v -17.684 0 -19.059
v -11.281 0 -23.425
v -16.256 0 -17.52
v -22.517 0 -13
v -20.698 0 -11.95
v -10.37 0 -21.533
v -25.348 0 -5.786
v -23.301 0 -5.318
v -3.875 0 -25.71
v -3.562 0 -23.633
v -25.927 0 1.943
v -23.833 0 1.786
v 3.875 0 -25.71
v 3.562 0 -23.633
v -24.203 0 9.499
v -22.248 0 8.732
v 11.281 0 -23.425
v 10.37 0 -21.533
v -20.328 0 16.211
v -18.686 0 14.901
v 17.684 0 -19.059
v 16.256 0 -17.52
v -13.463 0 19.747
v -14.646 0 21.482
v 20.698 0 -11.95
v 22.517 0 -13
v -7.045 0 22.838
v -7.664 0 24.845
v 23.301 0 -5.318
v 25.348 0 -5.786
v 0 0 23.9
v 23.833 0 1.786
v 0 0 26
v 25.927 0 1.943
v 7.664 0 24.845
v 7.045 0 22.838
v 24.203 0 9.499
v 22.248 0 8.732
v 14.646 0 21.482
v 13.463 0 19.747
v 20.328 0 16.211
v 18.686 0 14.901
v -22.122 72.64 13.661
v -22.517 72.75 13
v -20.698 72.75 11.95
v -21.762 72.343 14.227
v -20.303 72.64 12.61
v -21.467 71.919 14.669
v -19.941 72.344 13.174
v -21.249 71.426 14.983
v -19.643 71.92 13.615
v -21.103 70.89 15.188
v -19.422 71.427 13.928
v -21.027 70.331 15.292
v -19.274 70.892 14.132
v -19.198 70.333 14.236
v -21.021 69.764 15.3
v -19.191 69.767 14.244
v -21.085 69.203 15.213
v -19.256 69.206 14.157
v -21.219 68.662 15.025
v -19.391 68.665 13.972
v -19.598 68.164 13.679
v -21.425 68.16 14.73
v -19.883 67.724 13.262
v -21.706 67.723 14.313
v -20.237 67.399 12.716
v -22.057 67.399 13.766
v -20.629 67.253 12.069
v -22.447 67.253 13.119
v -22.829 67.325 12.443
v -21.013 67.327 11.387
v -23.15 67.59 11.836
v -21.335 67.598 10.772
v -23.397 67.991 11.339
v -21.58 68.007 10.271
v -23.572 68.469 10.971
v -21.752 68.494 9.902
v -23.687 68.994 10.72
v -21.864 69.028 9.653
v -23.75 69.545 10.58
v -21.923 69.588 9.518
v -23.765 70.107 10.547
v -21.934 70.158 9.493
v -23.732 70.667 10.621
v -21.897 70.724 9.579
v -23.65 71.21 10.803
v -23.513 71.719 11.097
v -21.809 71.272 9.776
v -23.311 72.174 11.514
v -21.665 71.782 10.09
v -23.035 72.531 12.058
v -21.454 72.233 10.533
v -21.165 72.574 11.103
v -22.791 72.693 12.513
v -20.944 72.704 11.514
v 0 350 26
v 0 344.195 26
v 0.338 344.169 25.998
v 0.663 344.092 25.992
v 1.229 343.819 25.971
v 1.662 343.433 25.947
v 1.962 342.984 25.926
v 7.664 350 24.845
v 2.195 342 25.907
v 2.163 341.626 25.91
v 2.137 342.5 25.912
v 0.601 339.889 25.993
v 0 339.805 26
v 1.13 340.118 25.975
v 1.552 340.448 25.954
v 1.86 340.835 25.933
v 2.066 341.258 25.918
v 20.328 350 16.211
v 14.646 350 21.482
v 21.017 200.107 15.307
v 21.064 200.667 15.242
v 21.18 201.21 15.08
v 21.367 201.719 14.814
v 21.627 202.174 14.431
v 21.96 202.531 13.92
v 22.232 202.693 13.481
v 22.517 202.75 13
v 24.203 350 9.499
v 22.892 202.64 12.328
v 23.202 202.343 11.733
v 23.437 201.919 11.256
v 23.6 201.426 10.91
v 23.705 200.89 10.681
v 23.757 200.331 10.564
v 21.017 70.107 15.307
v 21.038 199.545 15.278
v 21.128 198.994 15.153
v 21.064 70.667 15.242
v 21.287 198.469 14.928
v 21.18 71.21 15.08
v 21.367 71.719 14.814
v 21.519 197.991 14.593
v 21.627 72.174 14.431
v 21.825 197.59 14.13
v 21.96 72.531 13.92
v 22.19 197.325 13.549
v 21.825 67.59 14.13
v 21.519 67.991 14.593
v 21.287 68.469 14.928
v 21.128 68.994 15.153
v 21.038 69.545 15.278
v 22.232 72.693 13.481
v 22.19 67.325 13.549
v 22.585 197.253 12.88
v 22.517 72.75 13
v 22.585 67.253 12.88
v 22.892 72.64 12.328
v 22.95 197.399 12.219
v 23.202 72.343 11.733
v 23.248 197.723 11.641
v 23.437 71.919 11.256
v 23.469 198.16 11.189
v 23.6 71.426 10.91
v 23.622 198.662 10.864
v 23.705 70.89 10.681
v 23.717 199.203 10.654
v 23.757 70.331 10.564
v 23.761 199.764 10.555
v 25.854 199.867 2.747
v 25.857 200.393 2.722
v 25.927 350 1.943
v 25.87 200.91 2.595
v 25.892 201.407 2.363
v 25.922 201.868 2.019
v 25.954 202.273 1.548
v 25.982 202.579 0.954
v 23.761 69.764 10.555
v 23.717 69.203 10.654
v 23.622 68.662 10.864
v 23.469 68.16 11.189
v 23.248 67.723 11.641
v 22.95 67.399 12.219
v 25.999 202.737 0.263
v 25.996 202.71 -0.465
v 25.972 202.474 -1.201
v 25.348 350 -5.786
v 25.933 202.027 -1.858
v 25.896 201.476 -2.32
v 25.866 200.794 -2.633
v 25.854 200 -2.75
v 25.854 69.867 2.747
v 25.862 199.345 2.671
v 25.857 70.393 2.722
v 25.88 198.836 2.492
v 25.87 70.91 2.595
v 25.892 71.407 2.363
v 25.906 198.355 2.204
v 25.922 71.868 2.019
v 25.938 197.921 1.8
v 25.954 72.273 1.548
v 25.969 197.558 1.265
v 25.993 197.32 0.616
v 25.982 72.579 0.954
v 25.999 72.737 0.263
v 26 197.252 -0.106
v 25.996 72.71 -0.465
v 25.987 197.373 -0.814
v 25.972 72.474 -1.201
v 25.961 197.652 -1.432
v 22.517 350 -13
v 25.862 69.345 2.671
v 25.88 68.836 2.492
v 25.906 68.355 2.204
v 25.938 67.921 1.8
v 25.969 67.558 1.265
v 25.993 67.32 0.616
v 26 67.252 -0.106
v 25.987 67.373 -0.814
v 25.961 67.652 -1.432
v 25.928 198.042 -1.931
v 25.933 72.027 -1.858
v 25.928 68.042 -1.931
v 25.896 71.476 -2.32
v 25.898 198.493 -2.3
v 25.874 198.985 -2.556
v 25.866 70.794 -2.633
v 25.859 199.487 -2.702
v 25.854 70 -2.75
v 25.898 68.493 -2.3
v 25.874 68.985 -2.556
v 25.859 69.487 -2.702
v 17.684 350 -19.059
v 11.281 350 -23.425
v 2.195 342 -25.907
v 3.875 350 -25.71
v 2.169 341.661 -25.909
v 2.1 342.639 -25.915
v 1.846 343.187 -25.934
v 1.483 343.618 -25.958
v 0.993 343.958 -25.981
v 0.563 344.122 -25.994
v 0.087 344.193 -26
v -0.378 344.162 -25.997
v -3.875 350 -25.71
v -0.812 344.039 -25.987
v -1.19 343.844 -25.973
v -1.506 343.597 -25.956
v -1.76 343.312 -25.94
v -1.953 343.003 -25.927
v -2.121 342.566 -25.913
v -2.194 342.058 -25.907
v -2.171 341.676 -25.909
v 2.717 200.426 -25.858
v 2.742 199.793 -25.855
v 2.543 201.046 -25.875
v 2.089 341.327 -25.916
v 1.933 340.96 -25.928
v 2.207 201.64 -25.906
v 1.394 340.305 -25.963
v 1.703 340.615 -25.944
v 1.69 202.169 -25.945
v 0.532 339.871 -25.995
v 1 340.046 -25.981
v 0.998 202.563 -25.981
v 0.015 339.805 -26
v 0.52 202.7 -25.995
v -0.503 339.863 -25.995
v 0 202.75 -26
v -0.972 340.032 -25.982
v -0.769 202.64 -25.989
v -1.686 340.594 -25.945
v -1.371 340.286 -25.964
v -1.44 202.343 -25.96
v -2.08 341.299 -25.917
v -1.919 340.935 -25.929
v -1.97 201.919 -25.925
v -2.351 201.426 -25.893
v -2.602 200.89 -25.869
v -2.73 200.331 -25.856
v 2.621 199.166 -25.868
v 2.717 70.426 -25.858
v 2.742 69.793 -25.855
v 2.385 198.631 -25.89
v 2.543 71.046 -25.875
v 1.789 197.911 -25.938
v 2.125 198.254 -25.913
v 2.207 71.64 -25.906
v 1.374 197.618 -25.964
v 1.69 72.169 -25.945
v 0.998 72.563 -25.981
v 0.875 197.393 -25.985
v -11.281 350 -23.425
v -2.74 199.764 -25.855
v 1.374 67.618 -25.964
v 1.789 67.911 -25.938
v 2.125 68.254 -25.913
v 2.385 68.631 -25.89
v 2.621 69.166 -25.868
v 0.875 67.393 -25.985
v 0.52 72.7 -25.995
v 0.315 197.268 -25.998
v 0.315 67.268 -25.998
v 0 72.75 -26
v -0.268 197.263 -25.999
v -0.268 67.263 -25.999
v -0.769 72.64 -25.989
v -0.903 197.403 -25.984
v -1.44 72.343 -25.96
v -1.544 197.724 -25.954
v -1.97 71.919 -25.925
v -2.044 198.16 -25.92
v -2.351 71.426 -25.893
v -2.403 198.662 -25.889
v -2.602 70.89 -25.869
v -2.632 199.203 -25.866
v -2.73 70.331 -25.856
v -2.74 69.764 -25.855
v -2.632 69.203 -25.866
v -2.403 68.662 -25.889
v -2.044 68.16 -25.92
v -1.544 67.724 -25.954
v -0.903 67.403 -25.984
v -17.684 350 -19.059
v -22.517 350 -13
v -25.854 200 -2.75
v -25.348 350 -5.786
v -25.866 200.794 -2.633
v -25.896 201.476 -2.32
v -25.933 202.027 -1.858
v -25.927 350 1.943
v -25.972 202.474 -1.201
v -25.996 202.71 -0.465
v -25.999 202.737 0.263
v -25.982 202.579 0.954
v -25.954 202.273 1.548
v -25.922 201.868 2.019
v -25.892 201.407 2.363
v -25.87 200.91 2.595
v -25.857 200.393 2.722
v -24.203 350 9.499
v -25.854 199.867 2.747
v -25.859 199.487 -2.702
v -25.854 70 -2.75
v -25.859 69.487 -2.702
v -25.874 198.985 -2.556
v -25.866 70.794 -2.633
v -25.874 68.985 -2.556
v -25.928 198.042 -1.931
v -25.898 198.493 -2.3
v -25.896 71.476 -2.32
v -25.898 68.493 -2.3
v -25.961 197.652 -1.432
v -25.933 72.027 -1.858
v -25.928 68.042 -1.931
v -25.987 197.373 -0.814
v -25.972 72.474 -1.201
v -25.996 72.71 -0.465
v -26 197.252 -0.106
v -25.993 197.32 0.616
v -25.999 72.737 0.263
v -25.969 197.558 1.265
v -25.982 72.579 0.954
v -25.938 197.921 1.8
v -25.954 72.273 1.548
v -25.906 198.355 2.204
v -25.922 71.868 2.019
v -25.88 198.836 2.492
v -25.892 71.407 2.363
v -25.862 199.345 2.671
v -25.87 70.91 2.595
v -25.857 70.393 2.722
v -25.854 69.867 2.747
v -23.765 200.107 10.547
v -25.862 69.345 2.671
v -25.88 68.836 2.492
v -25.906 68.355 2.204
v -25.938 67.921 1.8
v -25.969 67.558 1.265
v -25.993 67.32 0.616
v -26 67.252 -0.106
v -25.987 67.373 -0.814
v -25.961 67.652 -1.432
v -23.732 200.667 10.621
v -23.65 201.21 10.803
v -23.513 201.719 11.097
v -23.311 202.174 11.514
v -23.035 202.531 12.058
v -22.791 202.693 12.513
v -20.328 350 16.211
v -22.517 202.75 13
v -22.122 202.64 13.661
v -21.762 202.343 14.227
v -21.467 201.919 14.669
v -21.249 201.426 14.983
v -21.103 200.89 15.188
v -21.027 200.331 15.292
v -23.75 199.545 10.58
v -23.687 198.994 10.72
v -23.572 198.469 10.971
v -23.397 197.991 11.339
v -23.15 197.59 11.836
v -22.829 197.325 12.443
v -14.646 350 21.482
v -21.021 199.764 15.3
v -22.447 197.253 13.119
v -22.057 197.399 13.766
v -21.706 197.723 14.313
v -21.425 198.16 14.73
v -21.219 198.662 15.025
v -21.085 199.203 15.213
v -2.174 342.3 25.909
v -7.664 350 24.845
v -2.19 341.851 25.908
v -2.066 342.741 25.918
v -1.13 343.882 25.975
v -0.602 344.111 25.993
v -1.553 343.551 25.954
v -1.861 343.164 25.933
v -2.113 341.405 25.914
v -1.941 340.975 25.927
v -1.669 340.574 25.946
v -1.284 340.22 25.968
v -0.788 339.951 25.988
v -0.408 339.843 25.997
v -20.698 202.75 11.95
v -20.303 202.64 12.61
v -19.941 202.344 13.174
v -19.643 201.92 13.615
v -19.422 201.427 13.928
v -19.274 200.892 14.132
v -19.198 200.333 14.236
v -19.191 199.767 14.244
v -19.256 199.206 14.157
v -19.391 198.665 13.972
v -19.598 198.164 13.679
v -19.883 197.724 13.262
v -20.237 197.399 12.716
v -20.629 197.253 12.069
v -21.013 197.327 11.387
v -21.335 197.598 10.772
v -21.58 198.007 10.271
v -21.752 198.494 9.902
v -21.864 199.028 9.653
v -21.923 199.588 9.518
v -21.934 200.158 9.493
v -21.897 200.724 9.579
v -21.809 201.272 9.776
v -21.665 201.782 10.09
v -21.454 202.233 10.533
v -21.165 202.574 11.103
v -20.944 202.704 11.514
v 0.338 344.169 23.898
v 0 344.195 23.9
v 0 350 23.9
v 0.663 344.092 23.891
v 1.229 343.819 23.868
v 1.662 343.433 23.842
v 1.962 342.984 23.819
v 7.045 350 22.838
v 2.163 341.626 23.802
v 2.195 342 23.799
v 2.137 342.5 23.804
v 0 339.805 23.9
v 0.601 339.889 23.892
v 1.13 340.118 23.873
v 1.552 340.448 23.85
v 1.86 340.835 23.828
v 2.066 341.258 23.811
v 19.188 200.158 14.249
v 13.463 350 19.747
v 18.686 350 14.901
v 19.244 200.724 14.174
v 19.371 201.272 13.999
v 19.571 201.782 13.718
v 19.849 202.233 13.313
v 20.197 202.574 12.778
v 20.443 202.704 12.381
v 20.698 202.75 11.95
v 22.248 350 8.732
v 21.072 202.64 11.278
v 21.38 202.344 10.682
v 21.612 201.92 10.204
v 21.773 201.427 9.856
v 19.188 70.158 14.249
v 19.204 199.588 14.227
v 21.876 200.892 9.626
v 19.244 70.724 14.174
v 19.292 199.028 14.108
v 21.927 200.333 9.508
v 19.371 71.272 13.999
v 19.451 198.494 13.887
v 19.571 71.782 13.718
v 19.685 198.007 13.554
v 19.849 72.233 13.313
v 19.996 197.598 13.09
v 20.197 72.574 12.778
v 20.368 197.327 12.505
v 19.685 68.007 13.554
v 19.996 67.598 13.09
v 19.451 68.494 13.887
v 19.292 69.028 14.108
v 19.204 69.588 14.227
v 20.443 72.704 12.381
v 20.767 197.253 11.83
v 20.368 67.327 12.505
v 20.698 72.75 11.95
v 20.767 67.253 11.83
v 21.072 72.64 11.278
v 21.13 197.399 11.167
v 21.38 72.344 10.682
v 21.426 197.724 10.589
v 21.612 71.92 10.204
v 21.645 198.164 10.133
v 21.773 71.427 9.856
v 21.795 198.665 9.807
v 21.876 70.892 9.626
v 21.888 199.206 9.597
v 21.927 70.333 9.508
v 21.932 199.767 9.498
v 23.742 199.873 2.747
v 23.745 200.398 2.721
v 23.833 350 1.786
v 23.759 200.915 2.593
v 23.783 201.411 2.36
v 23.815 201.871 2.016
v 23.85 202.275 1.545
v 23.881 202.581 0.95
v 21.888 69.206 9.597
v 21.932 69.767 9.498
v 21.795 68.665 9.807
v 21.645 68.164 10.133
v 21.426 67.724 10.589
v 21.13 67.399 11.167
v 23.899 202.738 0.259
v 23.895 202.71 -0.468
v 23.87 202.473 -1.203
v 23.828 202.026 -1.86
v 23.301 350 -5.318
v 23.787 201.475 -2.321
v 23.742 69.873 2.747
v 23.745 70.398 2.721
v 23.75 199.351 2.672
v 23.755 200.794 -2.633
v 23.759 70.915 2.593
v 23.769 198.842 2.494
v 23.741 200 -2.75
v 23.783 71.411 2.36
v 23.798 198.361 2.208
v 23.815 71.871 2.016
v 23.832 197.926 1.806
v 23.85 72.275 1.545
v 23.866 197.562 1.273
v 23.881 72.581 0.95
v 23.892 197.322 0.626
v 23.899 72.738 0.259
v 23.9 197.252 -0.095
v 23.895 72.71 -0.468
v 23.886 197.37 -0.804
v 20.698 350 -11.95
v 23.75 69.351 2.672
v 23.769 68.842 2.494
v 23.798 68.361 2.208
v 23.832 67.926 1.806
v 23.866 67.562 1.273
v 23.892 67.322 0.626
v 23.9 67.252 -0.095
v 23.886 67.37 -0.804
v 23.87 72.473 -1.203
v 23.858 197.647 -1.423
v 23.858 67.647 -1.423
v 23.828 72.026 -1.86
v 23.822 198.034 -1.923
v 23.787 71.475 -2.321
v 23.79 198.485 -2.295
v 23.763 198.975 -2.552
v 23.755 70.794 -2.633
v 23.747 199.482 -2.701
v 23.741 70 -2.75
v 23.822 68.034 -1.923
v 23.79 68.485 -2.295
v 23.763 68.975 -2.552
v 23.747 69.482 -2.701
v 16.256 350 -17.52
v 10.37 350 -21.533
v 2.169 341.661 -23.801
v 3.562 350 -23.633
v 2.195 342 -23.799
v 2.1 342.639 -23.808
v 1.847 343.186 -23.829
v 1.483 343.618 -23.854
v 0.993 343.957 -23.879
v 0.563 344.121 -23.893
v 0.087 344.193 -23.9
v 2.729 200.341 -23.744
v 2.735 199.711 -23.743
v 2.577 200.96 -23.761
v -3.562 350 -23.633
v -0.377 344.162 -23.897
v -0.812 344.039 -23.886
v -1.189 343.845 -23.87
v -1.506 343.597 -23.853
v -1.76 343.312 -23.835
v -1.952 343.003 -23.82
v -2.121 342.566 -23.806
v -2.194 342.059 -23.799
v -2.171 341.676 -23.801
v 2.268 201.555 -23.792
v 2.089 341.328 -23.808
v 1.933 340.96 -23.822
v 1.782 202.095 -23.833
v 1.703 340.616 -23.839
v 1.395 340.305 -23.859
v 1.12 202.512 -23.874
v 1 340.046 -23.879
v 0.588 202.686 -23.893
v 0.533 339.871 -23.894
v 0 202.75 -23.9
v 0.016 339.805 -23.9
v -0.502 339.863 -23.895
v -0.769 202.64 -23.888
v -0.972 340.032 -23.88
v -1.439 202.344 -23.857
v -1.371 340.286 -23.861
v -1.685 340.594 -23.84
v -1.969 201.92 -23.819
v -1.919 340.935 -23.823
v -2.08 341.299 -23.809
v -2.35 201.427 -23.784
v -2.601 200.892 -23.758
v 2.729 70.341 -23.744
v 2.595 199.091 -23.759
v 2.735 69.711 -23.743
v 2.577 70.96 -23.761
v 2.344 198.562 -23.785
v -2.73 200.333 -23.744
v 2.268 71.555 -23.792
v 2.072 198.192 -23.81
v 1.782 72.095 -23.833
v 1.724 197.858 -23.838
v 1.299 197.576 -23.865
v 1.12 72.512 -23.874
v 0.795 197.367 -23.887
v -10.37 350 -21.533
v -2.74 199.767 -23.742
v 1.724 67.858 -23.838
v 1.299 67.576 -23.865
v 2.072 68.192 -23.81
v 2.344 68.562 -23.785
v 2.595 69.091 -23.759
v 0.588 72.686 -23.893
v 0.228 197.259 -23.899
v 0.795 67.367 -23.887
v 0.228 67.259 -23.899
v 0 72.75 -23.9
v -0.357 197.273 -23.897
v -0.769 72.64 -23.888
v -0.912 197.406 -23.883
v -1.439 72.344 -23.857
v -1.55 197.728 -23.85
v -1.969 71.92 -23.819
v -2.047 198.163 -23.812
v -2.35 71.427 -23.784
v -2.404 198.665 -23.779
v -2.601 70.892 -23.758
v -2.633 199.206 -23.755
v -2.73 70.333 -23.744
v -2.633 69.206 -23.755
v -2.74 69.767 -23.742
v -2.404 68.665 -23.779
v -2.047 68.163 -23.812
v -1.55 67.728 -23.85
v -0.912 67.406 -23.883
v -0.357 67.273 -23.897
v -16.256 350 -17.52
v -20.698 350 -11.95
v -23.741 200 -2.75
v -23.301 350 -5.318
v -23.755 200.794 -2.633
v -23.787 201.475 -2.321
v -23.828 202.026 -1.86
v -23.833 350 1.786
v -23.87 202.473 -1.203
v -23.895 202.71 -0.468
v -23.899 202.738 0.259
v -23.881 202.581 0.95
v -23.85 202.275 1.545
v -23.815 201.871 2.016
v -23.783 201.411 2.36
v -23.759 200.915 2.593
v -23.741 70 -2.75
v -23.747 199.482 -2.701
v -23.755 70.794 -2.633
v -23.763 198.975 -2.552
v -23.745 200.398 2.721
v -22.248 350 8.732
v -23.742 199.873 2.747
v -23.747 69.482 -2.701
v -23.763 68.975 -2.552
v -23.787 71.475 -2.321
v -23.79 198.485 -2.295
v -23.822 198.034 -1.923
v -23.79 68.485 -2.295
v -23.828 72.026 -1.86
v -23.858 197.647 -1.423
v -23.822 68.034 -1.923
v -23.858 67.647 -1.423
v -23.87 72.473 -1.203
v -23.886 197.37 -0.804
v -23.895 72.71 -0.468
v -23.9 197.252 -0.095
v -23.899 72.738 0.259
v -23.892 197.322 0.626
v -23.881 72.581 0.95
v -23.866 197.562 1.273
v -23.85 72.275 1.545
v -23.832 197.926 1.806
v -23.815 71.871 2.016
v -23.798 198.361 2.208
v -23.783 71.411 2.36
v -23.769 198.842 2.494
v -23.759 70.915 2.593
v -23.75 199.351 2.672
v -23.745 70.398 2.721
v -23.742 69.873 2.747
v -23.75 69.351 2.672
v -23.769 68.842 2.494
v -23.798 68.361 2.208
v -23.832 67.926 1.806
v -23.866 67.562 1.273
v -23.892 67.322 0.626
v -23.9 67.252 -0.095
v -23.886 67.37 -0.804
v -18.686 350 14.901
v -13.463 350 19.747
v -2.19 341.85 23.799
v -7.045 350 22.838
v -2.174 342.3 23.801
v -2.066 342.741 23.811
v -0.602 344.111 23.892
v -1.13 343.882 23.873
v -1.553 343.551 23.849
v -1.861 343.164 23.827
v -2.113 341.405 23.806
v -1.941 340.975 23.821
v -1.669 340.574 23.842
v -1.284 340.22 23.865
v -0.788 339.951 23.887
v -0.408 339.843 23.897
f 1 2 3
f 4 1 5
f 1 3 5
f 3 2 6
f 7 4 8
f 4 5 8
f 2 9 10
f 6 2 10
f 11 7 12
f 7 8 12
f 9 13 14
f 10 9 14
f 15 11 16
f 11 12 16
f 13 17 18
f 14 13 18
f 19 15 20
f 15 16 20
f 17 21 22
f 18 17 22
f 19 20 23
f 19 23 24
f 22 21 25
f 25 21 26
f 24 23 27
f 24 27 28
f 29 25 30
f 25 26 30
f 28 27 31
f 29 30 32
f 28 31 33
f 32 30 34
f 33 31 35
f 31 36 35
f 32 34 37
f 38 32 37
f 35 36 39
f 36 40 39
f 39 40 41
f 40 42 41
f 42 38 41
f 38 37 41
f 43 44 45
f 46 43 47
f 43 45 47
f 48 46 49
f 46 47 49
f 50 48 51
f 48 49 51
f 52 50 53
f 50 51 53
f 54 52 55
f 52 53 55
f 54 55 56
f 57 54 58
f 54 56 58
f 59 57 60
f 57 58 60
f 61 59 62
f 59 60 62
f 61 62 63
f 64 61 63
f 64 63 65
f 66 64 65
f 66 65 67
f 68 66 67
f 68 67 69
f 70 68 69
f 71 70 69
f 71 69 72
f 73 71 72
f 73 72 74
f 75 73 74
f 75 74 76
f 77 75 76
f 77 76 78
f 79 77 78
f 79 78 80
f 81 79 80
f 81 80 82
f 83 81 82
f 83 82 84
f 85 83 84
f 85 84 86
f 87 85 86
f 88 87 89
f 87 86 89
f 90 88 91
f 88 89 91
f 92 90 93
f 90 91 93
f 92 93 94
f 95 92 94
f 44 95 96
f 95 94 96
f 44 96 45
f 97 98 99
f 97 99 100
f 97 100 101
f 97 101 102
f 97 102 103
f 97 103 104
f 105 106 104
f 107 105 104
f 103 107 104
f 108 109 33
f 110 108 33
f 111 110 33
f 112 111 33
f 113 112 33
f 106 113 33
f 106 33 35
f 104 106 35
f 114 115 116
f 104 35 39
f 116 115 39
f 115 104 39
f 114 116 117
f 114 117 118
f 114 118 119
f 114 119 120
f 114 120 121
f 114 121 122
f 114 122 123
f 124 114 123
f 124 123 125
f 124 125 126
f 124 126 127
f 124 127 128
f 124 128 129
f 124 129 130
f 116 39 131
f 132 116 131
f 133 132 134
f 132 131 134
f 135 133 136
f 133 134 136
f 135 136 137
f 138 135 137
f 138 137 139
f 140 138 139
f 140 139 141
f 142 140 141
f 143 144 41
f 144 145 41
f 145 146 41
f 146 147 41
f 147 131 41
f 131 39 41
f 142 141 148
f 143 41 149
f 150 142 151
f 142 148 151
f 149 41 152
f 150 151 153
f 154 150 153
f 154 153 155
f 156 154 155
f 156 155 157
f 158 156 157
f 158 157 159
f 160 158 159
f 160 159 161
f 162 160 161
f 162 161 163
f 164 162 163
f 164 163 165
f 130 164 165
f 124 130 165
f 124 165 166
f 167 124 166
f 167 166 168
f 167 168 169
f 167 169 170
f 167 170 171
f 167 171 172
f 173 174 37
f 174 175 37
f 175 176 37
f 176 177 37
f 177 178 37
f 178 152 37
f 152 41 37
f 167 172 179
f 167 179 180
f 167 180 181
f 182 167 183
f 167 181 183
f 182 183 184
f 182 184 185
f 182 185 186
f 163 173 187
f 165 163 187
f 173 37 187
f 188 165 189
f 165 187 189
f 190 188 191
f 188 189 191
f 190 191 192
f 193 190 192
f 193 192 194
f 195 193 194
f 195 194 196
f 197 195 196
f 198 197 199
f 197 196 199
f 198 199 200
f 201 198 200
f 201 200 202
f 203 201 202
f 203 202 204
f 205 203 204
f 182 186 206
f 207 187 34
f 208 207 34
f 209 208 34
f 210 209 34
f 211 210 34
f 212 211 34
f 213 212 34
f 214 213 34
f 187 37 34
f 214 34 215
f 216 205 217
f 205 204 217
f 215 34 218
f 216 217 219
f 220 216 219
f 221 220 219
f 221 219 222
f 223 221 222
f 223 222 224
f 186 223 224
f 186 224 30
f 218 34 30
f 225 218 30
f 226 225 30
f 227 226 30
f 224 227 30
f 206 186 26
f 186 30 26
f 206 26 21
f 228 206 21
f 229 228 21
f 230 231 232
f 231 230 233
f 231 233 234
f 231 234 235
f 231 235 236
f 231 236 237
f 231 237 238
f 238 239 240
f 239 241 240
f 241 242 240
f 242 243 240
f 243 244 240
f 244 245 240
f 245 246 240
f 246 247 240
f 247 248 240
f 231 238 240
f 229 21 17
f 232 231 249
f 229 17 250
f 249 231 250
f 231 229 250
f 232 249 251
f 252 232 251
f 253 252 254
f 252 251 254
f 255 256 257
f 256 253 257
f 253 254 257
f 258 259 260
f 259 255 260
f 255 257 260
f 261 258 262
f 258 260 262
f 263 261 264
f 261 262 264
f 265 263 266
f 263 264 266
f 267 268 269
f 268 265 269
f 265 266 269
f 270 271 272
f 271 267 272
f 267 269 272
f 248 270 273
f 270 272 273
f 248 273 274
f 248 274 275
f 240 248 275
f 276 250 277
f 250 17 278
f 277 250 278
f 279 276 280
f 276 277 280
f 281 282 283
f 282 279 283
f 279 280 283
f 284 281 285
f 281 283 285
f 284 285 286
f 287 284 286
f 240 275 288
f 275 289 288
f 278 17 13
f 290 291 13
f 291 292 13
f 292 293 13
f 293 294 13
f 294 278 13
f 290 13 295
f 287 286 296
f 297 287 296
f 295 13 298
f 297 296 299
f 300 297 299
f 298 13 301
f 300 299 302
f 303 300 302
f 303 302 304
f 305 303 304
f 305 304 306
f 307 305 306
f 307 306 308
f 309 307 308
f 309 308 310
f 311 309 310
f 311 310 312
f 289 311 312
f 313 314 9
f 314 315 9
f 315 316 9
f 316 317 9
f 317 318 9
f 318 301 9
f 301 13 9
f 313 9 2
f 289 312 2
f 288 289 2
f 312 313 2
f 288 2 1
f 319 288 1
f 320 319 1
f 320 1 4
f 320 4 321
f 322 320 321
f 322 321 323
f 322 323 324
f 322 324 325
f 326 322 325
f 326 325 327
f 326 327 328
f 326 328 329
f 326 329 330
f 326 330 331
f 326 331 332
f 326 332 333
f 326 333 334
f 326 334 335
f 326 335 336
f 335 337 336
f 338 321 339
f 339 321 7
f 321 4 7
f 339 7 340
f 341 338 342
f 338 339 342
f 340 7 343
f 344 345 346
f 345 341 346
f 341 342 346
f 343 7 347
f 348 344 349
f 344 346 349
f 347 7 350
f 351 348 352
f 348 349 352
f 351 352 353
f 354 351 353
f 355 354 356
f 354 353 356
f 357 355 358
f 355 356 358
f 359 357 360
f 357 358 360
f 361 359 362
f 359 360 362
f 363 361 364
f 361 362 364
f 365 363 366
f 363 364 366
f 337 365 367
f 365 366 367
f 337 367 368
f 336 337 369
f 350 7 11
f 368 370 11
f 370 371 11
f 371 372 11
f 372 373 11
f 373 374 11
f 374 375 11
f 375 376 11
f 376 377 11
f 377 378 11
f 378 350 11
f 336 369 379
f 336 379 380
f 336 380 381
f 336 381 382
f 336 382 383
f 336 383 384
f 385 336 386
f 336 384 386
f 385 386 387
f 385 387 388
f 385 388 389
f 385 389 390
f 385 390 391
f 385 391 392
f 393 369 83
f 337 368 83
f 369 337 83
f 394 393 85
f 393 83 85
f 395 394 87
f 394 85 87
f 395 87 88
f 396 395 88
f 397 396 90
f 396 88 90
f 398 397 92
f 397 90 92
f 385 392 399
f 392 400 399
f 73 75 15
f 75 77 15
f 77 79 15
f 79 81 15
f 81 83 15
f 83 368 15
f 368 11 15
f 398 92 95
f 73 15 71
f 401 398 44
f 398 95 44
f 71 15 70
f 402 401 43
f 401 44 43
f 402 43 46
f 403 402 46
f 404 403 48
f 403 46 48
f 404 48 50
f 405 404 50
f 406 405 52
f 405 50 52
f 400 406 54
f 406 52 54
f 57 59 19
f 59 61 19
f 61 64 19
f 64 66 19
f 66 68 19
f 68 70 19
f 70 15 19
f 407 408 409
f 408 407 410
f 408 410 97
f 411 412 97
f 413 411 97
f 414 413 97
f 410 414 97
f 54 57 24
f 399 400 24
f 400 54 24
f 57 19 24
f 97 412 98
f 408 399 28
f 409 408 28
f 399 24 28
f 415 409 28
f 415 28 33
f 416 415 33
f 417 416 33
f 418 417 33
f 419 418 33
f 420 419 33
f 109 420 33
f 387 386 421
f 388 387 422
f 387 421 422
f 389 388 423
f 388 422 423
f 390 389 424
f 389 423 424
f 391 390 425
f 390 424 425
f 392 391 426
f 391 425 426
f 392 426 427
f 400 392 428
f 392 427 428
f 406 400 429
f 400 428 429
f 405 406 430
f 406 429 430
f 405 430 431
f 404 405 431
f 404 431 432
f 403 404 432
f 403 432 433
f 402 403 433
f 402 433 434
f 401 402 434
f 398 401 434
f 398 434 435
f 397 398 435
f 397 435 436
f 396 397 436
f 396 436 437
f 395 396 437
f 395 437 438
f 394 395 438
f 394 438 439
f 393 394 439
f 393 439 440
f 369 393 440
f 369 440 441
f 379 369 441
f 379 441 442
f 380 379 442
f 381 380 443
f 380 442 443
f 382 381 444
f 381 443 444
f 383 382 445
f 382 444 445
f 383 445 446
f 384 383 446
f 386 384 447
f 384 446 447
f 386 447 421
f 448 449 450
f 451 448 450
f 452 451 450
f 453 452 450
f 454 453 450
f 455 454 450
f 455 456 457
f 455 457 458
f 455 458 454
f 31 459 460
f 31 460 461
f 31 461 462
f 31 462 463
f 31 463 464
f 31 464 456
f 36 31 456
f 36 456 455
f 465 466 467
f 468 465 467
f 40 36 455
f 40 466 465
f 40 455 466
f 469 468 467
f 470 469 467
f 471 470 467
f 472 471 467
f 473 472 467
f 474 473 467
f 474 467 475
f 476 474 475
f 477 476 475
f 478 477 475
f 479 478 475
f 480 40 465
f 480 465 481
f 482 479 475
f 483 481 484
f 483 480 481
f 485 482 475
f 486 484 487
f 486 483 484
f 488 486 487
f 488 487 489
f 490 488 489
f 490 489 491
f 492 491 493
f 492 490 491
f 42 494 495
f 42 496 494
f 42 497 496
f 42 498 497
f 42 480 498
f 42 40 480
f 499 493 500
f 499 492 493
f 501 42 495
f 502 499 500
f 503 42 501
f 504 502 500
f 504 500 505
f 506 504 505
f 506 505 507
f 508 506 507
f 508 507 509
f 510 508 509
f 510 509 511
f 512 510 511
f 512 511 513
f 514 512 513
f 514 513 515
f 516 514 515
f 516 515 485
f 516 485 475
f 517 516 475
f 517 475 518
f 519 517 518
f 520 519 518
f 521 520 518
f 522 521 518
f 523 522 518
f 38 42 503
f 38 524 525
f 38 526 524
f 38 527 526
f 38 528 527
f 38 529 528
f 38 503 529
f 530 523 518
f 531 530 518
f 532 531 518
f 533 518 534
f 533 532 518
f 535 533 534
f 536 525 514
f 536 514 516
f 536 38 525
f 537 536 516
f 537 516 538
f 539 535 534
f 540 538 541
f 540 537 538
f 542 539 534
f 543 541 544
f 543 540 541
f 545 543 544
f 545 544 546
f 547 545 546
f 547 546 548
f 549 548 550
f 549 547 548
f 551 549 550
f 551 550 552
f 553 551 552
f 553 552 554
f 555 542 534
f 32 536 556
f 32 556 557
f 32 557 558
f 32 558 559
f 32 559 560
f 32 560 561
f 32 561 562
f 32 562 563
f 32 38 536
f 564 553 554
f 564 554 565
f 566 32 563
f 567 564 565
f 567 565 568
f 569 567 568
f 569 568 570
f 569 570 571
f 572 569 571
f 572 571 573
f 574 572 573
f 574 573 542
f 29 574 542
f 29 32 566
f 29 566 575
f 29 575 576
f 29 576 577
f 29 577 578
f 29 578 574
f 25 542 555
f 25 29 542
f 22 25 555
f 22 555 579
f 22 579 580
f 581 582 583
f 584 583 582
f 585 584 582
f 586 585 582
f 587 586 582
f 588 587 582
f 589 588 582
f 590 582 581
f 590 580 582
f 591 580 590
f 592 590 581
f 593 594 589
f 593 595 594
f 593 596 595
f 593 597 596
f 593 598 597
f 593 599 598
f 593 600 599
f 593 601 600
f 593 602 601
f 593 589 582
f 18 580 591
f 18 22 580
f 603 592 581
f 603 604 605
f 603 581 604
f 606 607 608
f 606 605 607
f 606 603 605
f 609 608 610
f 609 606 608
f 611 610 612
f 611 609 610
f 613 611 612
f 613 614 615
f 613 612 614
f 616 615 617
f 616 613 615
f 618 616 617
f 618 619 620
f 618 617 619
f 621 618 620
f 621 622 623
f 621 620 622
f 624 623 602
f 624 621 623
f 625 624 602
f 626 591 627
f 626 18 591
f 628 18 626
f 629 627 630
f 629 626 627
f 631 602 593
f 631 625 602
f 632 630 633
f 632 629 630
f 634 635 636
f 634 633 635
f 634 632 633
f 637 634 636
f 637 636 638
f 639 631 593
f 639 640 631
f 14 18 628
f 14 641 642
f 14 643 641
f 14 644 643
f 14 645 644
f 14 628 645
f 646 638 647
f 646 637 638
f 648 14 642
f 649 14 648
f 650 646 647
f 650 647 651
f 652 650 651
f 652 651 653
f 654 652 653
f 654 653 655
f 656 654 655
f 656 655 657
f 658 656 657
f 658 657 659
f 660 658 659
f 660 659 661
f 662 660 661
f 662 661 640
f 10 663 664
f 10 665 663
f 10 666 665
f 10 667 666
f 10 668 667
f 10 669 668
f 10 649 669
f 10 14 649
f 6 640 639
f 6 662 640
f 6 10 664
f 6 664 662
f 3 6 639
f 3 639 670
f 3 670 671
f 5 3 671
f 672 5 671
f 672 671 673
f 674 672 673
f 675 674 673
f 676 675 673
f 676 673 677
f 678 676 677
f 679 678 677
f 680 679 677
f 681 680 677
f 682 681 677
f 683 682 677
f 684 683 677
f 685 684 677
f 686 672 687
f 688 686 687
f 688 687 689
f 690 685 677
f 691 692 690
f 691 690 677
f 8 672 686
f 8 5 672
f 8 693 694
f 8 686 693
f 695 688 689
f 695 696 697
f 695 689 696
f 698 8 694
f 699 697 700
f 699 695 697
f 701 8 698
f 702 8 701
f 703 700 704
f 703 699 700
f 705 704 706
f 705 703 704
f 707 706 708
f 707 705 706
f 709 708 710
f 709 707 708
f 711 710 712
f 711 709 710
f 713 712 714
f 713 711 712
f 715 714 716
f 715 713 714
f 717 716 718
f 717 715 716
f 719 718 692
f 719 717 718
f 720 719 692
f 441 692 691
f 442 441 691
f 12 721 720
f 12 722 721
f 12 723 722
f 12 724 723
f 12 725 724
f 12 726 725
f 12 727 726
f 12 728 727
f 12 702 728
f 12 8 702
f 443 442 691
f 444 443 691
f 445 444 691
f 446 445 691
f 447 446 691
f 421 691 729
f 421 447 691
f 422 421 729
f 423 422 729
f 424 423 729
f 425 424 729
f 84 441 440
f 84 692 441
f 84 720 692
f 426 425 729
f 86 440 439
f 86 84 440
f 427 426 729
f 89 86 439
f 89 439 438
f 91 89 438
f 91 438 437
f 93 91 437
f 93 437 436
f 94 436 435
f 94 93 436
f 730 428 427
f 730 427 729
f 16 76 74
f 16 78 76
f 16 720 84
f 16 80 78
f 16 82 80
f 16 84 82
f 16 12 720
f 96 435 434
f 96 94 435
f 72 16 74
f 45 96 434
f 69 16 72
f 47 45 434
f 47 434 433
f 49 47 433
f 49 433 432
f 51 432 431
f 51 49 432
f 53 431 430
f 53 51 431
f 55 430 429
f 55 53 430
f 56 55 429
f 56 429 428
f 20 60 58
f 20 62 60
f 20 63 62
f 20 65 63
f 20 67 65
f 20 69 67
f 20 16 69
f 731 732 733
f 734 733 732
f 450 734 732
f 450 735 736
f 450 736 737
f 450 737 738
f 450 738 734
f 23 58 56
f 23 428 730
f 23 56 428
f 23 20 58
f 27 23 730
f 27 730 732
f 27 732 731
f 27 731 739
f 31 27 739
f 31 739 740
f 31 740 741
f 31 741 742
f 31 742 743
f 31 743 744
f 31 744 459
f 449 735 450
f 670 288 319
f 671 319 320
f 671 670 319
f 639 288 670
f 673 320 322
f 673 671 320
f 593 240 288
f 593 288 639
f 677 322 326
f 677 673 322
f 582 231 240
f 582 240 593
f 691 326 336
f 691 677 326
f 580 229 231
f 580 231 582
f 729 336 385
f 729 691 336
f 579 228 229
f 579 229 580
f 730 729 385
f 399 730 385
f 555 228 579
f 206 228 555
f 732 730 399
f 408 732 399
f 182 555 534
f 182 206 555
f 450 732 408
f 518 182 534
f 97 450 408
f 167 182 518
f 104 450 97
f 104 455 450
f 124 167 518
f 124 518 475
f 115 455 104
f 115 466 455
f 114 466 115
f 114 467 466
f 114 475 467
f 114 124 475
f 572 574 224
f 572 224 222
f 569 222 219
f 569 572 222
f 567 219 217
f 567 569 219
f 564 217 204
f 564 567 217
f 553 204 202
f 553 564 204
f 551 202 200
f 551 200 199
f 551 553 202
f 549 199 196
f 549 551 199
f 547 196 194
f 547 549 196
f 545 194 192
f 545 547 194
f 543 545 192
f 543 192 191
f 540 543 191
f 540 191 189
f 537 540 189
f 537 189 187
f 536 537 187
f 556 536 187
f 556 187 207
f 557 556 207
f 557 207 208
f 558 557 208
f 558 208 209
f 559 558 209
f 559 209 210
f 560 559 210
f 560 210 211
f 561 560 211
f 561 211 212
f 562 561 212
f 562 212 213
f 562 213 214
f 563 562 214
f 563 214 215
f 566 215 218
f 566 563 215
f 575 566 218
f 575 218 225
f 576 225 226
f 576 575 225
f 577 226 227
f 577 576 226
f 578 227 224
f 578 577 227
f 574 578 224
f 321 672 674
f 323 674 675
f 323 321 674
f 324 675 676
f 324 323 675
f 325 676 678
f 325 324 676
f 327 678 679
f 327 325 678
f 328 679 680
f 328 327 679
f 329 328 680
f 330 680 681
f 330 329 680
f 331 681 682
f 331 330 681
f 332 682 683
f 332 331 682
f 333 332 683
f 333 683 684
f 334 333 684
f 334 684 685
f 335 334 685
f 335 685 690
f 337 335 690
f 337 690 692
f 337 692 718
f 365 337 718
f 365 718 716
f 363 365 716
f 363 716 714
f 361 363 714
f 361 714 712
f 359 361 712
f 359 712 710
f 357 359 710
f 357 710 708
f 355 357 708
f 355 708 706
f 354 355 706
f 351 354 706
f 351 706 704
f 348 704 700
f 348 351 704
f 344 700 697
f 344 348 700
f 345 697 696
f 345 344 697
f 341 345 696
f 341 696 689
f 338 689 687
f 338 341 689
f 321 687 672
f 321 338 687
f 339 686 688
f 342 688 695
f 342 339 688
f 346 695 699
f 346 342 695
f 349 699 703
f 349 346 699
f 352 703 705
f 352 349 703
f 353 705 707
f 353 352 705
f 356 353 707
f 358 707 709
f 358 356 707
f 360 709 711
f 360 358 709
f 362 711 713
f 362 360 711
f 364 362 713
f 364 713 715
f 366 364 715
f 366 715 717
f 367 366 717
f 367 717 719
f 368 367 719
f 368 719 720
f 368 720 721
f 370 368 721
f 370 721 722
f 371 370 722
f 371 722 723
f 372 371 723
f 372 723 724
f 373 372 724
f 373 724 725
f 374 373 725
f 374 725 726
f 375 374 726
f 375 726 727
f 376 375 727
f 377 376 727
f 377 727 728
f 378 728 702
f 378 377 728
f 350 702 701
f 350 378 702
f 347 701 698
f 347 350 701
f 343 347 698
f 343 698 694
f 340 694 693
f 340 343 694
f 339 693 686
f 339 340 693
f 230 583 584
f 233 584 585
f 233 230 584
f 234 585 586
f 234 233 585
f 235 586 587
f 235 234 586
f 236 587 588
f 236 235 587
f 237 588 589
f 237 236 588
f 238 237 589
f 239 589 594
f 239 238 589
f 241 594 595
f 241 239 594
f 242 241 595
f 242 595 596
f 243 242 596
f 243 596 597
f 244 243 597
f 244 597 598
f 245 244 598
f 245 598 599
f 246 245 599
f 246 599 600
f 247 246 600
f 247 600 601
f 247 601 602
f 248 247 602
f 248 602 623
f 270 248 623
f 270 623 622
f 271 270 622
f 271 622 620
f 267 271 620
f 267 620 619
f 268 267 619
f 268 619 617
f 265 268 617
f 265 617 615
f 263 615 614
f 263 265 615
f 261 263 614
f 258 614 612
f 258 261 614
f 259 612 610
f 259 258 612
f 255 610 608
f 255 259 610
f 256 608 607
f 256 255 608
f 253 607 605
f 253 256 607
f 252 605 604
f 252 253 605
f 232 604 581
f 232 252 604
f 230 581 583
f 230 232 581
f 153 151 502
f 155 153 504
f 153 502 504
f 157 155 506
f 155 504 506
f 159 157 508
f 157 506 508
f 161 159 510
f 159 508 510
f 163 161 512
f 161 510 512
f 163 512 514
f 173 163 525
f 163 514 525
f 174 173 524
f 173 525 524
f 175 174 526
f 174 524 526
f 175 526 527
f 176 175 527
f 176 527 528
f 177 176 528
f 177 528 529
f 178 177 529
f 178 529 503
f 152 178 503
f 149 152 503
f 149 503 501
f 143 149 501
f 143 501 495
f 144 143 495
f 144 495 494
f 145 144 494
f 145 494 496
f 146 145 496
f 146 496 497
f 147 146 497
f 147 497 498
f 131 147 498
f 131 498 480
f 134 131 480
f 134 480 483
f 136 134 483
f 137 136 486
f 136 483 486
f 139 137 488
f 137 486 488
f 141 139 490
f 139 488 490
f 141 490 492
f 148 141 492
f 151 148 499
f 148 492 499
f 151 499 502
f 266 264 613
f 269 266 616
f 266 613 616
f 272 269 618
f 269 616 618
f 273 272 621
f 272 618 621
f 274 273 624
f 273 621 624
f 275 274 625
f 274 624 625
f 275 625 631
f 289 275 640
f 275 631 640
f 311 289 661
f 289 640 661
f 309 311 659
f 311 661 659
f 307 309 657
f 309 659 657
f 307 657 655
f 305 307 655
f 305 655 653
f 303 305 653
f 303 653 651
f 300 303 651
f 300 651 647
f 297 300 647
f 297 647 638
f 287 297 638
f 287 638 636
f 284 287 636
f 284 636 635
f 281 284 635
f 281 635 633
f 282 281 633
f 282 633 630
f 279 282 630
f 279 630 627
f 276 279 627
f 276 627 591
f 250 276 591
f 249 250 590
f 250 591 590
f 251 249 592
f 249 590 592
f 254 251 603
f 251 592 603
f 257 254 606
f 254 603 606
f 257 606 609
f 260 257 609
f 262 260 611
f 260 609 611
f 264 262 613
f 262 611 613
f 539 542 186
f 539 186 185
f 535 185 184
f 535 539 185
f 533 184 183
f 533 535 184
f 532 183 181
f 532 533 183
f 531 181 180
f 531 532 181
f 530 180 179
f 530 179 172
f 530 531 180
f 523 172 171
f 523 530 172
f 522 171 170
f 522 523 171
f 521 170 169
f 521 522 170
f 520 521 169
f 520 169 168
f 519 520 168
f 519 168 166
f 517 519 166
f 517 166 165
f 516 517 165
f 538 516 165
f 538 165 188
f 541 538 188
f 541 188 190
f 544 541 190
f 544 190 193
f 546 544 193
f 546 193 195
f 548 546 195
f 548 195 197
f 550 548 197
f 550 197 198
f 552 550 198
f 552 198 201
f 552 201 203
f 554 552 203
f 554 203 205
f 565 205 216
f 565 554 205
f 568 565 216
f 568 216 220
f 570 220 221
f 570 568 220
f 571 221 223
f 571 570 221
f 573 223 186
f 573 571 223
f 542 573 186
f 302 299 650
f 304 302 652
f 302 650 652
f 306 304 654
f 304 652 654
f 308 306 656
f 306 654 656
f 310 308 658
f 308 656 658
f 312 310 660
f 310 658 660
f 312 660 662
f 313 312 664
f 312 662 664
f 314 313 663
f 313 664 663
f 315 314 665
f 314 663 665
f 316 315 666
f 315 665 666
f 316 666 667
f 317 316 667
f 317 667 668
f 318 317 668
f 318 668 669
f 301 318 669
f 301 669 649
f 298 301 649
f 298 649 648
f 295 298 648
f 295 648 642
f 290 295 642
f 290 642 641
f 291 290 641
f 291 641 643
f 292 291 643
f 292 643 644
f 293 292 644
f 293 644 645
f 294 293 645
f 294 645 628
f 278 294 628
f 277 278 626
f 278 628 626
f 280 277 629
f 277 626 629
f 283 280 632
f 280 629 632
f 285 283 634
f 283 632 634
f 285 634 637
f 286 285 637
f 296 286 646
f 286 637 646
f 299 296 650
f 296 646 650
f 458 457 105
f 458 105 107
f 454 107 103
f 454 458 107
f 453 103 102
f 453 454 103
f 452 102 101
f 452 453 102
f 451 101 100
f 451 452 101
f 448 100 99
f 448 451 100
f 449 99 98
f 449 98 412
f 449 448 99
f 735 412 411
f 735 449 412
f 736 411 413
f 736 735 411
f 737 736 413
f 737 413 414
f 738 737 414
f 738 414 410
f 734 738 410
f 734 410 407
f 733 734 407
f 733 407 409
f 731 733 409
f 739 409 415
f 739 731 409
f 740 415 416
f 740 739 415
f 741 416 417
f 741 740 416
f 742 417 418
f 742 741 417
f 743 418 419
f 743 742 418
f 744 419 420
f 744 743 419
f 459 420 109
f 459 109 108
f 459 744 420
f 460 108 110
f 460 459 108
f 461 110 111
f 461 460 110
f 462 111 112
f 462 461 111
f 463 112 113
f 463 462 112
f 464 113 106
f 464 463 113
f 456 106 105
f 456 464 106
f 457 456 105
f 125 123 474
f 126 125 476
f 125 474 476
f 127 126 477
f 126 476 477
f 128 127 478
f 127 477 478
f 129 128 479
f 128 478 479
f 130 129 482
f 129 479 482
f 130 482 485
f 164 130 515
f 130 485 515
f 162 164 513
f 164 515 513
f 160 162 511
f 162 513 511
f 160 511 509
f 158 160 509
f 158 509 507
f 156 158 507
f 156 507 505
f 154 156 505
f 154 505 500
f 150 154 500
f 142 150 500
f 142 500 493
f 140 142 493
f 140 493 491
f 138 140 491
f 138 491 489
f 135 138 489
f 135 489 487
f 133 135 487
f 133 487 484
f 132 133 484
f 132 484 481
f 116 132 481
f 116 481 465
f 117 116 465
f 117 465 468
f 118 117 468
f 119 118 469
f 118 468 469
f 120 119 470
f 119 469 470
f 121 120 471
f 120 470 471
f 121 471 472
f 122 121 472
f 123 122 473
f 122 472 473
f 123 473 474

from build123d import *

# Parameters (mm, degrees)
SKETCH1_R               = 26
SKETCH1_R_2             = 23.9
BOSS_EXTRUDE1_DEPTH     = 350
SKETCH3_R               = 2.75
CUT_EXTRUDE2_DEPTH      = 352.926128612
CIRPATTERN1_COUNT       = 3
CUT_EXTRUDE3_DEPTH      = 352.926128726
CUT_EXTRUDE3_DEPTH_BACK = 352.926128726
SKETCH5_R               = 2.75
CUT_EXTRUDE4_DEPTH      = 352.926128726
CUT_EXTRUDE4_DEPTH_BACK = 352.926128726
SKETCH6_R               = 2.194915


with BuildPart() as part:
    # Sketch1 → Boss-Extrude1 (new body)
    with BuildSketch(Plane(origin=(0, 0, 0), x_dir=(1, 0, 0), z_dir=(0, 1, 0))):
        with Locations(Location((0, 0, 0), (0, 0, 270))):
            Circle(SKETCH1_R)
        with Locations(Location((0, 0, 0), (0, 0, 270))):
            Circle(SKETCH1_R_2, mode=Mode.SUBTRACT)
    extrude(amount=BOSS_EXTRUDE1_DEPTH)

    # Sketch3 → Cut-Extrude2 (cut, through all)
    with BuildSketch(Plane.XY):
        with Locations(Location((0, 70, 0), (0, 0, 90))):
            Circle(SKETCH3_R)
        with Locations(Location((0, 200, 0), (0, 0, 90))):
            Circle(SKETCH3_R)
    cut_extrude2 = extrude(amount=-CUT_EXTRUDE2_DEPTH, mode=Mode.SUBTRACT)

    # CirPattern1: Cut-Extrude2 ×3 about axis
    cirpattern1_axis = Axis((0, 350, 0), (0, -1, 0))
    for i in range(1, CIRPATTERN1_COUNT):
        add(cut_extrude2.rotate(cirpattern1_axis, i * 360 / CIRPATTERN1_COUNT), mode=Mode.SUBTRACT)

    # Sketch5 → Cut-Extrude3 (cut, two sides: drawn at the far end of the back side and taken through both)
    with BuildSketch(Plane(origin=(0, 0, 0), x_dir=(0, 0, -1), z_dir=(1, 0, 0)).offset(-CUT_EXTRUDE3_DEPTH_BACK)):
        with Locations((0, 200)):
            Circle(SKETCH5_R)
        with Locations((0, 70)):
            Circle(SKETCH5_R)
    extrude(amount=CUT_EXTRUDE3_DEPTH + CUT_EXTRUDE3_DEPTH_BACK, mode=Mode.SUBTRACT)

    # Sketch6 → Cut-Extrude4 (cut, two sides: drawn at the far end of the back side and taken through both)
    with BuildSketch(Plane.XY.offset(-CUT_EXTRUDE4_DEPTH_BACK)):
        with Locations((0, 342)):
            Circle(SKETCH6_R)
    extrude(amount=CUT_EXTRUDE4_DEPTH + CUT_EXTRUDE4_DEPTH_BACK, mode=Mode.SUBTRACT)


solid = part.part
